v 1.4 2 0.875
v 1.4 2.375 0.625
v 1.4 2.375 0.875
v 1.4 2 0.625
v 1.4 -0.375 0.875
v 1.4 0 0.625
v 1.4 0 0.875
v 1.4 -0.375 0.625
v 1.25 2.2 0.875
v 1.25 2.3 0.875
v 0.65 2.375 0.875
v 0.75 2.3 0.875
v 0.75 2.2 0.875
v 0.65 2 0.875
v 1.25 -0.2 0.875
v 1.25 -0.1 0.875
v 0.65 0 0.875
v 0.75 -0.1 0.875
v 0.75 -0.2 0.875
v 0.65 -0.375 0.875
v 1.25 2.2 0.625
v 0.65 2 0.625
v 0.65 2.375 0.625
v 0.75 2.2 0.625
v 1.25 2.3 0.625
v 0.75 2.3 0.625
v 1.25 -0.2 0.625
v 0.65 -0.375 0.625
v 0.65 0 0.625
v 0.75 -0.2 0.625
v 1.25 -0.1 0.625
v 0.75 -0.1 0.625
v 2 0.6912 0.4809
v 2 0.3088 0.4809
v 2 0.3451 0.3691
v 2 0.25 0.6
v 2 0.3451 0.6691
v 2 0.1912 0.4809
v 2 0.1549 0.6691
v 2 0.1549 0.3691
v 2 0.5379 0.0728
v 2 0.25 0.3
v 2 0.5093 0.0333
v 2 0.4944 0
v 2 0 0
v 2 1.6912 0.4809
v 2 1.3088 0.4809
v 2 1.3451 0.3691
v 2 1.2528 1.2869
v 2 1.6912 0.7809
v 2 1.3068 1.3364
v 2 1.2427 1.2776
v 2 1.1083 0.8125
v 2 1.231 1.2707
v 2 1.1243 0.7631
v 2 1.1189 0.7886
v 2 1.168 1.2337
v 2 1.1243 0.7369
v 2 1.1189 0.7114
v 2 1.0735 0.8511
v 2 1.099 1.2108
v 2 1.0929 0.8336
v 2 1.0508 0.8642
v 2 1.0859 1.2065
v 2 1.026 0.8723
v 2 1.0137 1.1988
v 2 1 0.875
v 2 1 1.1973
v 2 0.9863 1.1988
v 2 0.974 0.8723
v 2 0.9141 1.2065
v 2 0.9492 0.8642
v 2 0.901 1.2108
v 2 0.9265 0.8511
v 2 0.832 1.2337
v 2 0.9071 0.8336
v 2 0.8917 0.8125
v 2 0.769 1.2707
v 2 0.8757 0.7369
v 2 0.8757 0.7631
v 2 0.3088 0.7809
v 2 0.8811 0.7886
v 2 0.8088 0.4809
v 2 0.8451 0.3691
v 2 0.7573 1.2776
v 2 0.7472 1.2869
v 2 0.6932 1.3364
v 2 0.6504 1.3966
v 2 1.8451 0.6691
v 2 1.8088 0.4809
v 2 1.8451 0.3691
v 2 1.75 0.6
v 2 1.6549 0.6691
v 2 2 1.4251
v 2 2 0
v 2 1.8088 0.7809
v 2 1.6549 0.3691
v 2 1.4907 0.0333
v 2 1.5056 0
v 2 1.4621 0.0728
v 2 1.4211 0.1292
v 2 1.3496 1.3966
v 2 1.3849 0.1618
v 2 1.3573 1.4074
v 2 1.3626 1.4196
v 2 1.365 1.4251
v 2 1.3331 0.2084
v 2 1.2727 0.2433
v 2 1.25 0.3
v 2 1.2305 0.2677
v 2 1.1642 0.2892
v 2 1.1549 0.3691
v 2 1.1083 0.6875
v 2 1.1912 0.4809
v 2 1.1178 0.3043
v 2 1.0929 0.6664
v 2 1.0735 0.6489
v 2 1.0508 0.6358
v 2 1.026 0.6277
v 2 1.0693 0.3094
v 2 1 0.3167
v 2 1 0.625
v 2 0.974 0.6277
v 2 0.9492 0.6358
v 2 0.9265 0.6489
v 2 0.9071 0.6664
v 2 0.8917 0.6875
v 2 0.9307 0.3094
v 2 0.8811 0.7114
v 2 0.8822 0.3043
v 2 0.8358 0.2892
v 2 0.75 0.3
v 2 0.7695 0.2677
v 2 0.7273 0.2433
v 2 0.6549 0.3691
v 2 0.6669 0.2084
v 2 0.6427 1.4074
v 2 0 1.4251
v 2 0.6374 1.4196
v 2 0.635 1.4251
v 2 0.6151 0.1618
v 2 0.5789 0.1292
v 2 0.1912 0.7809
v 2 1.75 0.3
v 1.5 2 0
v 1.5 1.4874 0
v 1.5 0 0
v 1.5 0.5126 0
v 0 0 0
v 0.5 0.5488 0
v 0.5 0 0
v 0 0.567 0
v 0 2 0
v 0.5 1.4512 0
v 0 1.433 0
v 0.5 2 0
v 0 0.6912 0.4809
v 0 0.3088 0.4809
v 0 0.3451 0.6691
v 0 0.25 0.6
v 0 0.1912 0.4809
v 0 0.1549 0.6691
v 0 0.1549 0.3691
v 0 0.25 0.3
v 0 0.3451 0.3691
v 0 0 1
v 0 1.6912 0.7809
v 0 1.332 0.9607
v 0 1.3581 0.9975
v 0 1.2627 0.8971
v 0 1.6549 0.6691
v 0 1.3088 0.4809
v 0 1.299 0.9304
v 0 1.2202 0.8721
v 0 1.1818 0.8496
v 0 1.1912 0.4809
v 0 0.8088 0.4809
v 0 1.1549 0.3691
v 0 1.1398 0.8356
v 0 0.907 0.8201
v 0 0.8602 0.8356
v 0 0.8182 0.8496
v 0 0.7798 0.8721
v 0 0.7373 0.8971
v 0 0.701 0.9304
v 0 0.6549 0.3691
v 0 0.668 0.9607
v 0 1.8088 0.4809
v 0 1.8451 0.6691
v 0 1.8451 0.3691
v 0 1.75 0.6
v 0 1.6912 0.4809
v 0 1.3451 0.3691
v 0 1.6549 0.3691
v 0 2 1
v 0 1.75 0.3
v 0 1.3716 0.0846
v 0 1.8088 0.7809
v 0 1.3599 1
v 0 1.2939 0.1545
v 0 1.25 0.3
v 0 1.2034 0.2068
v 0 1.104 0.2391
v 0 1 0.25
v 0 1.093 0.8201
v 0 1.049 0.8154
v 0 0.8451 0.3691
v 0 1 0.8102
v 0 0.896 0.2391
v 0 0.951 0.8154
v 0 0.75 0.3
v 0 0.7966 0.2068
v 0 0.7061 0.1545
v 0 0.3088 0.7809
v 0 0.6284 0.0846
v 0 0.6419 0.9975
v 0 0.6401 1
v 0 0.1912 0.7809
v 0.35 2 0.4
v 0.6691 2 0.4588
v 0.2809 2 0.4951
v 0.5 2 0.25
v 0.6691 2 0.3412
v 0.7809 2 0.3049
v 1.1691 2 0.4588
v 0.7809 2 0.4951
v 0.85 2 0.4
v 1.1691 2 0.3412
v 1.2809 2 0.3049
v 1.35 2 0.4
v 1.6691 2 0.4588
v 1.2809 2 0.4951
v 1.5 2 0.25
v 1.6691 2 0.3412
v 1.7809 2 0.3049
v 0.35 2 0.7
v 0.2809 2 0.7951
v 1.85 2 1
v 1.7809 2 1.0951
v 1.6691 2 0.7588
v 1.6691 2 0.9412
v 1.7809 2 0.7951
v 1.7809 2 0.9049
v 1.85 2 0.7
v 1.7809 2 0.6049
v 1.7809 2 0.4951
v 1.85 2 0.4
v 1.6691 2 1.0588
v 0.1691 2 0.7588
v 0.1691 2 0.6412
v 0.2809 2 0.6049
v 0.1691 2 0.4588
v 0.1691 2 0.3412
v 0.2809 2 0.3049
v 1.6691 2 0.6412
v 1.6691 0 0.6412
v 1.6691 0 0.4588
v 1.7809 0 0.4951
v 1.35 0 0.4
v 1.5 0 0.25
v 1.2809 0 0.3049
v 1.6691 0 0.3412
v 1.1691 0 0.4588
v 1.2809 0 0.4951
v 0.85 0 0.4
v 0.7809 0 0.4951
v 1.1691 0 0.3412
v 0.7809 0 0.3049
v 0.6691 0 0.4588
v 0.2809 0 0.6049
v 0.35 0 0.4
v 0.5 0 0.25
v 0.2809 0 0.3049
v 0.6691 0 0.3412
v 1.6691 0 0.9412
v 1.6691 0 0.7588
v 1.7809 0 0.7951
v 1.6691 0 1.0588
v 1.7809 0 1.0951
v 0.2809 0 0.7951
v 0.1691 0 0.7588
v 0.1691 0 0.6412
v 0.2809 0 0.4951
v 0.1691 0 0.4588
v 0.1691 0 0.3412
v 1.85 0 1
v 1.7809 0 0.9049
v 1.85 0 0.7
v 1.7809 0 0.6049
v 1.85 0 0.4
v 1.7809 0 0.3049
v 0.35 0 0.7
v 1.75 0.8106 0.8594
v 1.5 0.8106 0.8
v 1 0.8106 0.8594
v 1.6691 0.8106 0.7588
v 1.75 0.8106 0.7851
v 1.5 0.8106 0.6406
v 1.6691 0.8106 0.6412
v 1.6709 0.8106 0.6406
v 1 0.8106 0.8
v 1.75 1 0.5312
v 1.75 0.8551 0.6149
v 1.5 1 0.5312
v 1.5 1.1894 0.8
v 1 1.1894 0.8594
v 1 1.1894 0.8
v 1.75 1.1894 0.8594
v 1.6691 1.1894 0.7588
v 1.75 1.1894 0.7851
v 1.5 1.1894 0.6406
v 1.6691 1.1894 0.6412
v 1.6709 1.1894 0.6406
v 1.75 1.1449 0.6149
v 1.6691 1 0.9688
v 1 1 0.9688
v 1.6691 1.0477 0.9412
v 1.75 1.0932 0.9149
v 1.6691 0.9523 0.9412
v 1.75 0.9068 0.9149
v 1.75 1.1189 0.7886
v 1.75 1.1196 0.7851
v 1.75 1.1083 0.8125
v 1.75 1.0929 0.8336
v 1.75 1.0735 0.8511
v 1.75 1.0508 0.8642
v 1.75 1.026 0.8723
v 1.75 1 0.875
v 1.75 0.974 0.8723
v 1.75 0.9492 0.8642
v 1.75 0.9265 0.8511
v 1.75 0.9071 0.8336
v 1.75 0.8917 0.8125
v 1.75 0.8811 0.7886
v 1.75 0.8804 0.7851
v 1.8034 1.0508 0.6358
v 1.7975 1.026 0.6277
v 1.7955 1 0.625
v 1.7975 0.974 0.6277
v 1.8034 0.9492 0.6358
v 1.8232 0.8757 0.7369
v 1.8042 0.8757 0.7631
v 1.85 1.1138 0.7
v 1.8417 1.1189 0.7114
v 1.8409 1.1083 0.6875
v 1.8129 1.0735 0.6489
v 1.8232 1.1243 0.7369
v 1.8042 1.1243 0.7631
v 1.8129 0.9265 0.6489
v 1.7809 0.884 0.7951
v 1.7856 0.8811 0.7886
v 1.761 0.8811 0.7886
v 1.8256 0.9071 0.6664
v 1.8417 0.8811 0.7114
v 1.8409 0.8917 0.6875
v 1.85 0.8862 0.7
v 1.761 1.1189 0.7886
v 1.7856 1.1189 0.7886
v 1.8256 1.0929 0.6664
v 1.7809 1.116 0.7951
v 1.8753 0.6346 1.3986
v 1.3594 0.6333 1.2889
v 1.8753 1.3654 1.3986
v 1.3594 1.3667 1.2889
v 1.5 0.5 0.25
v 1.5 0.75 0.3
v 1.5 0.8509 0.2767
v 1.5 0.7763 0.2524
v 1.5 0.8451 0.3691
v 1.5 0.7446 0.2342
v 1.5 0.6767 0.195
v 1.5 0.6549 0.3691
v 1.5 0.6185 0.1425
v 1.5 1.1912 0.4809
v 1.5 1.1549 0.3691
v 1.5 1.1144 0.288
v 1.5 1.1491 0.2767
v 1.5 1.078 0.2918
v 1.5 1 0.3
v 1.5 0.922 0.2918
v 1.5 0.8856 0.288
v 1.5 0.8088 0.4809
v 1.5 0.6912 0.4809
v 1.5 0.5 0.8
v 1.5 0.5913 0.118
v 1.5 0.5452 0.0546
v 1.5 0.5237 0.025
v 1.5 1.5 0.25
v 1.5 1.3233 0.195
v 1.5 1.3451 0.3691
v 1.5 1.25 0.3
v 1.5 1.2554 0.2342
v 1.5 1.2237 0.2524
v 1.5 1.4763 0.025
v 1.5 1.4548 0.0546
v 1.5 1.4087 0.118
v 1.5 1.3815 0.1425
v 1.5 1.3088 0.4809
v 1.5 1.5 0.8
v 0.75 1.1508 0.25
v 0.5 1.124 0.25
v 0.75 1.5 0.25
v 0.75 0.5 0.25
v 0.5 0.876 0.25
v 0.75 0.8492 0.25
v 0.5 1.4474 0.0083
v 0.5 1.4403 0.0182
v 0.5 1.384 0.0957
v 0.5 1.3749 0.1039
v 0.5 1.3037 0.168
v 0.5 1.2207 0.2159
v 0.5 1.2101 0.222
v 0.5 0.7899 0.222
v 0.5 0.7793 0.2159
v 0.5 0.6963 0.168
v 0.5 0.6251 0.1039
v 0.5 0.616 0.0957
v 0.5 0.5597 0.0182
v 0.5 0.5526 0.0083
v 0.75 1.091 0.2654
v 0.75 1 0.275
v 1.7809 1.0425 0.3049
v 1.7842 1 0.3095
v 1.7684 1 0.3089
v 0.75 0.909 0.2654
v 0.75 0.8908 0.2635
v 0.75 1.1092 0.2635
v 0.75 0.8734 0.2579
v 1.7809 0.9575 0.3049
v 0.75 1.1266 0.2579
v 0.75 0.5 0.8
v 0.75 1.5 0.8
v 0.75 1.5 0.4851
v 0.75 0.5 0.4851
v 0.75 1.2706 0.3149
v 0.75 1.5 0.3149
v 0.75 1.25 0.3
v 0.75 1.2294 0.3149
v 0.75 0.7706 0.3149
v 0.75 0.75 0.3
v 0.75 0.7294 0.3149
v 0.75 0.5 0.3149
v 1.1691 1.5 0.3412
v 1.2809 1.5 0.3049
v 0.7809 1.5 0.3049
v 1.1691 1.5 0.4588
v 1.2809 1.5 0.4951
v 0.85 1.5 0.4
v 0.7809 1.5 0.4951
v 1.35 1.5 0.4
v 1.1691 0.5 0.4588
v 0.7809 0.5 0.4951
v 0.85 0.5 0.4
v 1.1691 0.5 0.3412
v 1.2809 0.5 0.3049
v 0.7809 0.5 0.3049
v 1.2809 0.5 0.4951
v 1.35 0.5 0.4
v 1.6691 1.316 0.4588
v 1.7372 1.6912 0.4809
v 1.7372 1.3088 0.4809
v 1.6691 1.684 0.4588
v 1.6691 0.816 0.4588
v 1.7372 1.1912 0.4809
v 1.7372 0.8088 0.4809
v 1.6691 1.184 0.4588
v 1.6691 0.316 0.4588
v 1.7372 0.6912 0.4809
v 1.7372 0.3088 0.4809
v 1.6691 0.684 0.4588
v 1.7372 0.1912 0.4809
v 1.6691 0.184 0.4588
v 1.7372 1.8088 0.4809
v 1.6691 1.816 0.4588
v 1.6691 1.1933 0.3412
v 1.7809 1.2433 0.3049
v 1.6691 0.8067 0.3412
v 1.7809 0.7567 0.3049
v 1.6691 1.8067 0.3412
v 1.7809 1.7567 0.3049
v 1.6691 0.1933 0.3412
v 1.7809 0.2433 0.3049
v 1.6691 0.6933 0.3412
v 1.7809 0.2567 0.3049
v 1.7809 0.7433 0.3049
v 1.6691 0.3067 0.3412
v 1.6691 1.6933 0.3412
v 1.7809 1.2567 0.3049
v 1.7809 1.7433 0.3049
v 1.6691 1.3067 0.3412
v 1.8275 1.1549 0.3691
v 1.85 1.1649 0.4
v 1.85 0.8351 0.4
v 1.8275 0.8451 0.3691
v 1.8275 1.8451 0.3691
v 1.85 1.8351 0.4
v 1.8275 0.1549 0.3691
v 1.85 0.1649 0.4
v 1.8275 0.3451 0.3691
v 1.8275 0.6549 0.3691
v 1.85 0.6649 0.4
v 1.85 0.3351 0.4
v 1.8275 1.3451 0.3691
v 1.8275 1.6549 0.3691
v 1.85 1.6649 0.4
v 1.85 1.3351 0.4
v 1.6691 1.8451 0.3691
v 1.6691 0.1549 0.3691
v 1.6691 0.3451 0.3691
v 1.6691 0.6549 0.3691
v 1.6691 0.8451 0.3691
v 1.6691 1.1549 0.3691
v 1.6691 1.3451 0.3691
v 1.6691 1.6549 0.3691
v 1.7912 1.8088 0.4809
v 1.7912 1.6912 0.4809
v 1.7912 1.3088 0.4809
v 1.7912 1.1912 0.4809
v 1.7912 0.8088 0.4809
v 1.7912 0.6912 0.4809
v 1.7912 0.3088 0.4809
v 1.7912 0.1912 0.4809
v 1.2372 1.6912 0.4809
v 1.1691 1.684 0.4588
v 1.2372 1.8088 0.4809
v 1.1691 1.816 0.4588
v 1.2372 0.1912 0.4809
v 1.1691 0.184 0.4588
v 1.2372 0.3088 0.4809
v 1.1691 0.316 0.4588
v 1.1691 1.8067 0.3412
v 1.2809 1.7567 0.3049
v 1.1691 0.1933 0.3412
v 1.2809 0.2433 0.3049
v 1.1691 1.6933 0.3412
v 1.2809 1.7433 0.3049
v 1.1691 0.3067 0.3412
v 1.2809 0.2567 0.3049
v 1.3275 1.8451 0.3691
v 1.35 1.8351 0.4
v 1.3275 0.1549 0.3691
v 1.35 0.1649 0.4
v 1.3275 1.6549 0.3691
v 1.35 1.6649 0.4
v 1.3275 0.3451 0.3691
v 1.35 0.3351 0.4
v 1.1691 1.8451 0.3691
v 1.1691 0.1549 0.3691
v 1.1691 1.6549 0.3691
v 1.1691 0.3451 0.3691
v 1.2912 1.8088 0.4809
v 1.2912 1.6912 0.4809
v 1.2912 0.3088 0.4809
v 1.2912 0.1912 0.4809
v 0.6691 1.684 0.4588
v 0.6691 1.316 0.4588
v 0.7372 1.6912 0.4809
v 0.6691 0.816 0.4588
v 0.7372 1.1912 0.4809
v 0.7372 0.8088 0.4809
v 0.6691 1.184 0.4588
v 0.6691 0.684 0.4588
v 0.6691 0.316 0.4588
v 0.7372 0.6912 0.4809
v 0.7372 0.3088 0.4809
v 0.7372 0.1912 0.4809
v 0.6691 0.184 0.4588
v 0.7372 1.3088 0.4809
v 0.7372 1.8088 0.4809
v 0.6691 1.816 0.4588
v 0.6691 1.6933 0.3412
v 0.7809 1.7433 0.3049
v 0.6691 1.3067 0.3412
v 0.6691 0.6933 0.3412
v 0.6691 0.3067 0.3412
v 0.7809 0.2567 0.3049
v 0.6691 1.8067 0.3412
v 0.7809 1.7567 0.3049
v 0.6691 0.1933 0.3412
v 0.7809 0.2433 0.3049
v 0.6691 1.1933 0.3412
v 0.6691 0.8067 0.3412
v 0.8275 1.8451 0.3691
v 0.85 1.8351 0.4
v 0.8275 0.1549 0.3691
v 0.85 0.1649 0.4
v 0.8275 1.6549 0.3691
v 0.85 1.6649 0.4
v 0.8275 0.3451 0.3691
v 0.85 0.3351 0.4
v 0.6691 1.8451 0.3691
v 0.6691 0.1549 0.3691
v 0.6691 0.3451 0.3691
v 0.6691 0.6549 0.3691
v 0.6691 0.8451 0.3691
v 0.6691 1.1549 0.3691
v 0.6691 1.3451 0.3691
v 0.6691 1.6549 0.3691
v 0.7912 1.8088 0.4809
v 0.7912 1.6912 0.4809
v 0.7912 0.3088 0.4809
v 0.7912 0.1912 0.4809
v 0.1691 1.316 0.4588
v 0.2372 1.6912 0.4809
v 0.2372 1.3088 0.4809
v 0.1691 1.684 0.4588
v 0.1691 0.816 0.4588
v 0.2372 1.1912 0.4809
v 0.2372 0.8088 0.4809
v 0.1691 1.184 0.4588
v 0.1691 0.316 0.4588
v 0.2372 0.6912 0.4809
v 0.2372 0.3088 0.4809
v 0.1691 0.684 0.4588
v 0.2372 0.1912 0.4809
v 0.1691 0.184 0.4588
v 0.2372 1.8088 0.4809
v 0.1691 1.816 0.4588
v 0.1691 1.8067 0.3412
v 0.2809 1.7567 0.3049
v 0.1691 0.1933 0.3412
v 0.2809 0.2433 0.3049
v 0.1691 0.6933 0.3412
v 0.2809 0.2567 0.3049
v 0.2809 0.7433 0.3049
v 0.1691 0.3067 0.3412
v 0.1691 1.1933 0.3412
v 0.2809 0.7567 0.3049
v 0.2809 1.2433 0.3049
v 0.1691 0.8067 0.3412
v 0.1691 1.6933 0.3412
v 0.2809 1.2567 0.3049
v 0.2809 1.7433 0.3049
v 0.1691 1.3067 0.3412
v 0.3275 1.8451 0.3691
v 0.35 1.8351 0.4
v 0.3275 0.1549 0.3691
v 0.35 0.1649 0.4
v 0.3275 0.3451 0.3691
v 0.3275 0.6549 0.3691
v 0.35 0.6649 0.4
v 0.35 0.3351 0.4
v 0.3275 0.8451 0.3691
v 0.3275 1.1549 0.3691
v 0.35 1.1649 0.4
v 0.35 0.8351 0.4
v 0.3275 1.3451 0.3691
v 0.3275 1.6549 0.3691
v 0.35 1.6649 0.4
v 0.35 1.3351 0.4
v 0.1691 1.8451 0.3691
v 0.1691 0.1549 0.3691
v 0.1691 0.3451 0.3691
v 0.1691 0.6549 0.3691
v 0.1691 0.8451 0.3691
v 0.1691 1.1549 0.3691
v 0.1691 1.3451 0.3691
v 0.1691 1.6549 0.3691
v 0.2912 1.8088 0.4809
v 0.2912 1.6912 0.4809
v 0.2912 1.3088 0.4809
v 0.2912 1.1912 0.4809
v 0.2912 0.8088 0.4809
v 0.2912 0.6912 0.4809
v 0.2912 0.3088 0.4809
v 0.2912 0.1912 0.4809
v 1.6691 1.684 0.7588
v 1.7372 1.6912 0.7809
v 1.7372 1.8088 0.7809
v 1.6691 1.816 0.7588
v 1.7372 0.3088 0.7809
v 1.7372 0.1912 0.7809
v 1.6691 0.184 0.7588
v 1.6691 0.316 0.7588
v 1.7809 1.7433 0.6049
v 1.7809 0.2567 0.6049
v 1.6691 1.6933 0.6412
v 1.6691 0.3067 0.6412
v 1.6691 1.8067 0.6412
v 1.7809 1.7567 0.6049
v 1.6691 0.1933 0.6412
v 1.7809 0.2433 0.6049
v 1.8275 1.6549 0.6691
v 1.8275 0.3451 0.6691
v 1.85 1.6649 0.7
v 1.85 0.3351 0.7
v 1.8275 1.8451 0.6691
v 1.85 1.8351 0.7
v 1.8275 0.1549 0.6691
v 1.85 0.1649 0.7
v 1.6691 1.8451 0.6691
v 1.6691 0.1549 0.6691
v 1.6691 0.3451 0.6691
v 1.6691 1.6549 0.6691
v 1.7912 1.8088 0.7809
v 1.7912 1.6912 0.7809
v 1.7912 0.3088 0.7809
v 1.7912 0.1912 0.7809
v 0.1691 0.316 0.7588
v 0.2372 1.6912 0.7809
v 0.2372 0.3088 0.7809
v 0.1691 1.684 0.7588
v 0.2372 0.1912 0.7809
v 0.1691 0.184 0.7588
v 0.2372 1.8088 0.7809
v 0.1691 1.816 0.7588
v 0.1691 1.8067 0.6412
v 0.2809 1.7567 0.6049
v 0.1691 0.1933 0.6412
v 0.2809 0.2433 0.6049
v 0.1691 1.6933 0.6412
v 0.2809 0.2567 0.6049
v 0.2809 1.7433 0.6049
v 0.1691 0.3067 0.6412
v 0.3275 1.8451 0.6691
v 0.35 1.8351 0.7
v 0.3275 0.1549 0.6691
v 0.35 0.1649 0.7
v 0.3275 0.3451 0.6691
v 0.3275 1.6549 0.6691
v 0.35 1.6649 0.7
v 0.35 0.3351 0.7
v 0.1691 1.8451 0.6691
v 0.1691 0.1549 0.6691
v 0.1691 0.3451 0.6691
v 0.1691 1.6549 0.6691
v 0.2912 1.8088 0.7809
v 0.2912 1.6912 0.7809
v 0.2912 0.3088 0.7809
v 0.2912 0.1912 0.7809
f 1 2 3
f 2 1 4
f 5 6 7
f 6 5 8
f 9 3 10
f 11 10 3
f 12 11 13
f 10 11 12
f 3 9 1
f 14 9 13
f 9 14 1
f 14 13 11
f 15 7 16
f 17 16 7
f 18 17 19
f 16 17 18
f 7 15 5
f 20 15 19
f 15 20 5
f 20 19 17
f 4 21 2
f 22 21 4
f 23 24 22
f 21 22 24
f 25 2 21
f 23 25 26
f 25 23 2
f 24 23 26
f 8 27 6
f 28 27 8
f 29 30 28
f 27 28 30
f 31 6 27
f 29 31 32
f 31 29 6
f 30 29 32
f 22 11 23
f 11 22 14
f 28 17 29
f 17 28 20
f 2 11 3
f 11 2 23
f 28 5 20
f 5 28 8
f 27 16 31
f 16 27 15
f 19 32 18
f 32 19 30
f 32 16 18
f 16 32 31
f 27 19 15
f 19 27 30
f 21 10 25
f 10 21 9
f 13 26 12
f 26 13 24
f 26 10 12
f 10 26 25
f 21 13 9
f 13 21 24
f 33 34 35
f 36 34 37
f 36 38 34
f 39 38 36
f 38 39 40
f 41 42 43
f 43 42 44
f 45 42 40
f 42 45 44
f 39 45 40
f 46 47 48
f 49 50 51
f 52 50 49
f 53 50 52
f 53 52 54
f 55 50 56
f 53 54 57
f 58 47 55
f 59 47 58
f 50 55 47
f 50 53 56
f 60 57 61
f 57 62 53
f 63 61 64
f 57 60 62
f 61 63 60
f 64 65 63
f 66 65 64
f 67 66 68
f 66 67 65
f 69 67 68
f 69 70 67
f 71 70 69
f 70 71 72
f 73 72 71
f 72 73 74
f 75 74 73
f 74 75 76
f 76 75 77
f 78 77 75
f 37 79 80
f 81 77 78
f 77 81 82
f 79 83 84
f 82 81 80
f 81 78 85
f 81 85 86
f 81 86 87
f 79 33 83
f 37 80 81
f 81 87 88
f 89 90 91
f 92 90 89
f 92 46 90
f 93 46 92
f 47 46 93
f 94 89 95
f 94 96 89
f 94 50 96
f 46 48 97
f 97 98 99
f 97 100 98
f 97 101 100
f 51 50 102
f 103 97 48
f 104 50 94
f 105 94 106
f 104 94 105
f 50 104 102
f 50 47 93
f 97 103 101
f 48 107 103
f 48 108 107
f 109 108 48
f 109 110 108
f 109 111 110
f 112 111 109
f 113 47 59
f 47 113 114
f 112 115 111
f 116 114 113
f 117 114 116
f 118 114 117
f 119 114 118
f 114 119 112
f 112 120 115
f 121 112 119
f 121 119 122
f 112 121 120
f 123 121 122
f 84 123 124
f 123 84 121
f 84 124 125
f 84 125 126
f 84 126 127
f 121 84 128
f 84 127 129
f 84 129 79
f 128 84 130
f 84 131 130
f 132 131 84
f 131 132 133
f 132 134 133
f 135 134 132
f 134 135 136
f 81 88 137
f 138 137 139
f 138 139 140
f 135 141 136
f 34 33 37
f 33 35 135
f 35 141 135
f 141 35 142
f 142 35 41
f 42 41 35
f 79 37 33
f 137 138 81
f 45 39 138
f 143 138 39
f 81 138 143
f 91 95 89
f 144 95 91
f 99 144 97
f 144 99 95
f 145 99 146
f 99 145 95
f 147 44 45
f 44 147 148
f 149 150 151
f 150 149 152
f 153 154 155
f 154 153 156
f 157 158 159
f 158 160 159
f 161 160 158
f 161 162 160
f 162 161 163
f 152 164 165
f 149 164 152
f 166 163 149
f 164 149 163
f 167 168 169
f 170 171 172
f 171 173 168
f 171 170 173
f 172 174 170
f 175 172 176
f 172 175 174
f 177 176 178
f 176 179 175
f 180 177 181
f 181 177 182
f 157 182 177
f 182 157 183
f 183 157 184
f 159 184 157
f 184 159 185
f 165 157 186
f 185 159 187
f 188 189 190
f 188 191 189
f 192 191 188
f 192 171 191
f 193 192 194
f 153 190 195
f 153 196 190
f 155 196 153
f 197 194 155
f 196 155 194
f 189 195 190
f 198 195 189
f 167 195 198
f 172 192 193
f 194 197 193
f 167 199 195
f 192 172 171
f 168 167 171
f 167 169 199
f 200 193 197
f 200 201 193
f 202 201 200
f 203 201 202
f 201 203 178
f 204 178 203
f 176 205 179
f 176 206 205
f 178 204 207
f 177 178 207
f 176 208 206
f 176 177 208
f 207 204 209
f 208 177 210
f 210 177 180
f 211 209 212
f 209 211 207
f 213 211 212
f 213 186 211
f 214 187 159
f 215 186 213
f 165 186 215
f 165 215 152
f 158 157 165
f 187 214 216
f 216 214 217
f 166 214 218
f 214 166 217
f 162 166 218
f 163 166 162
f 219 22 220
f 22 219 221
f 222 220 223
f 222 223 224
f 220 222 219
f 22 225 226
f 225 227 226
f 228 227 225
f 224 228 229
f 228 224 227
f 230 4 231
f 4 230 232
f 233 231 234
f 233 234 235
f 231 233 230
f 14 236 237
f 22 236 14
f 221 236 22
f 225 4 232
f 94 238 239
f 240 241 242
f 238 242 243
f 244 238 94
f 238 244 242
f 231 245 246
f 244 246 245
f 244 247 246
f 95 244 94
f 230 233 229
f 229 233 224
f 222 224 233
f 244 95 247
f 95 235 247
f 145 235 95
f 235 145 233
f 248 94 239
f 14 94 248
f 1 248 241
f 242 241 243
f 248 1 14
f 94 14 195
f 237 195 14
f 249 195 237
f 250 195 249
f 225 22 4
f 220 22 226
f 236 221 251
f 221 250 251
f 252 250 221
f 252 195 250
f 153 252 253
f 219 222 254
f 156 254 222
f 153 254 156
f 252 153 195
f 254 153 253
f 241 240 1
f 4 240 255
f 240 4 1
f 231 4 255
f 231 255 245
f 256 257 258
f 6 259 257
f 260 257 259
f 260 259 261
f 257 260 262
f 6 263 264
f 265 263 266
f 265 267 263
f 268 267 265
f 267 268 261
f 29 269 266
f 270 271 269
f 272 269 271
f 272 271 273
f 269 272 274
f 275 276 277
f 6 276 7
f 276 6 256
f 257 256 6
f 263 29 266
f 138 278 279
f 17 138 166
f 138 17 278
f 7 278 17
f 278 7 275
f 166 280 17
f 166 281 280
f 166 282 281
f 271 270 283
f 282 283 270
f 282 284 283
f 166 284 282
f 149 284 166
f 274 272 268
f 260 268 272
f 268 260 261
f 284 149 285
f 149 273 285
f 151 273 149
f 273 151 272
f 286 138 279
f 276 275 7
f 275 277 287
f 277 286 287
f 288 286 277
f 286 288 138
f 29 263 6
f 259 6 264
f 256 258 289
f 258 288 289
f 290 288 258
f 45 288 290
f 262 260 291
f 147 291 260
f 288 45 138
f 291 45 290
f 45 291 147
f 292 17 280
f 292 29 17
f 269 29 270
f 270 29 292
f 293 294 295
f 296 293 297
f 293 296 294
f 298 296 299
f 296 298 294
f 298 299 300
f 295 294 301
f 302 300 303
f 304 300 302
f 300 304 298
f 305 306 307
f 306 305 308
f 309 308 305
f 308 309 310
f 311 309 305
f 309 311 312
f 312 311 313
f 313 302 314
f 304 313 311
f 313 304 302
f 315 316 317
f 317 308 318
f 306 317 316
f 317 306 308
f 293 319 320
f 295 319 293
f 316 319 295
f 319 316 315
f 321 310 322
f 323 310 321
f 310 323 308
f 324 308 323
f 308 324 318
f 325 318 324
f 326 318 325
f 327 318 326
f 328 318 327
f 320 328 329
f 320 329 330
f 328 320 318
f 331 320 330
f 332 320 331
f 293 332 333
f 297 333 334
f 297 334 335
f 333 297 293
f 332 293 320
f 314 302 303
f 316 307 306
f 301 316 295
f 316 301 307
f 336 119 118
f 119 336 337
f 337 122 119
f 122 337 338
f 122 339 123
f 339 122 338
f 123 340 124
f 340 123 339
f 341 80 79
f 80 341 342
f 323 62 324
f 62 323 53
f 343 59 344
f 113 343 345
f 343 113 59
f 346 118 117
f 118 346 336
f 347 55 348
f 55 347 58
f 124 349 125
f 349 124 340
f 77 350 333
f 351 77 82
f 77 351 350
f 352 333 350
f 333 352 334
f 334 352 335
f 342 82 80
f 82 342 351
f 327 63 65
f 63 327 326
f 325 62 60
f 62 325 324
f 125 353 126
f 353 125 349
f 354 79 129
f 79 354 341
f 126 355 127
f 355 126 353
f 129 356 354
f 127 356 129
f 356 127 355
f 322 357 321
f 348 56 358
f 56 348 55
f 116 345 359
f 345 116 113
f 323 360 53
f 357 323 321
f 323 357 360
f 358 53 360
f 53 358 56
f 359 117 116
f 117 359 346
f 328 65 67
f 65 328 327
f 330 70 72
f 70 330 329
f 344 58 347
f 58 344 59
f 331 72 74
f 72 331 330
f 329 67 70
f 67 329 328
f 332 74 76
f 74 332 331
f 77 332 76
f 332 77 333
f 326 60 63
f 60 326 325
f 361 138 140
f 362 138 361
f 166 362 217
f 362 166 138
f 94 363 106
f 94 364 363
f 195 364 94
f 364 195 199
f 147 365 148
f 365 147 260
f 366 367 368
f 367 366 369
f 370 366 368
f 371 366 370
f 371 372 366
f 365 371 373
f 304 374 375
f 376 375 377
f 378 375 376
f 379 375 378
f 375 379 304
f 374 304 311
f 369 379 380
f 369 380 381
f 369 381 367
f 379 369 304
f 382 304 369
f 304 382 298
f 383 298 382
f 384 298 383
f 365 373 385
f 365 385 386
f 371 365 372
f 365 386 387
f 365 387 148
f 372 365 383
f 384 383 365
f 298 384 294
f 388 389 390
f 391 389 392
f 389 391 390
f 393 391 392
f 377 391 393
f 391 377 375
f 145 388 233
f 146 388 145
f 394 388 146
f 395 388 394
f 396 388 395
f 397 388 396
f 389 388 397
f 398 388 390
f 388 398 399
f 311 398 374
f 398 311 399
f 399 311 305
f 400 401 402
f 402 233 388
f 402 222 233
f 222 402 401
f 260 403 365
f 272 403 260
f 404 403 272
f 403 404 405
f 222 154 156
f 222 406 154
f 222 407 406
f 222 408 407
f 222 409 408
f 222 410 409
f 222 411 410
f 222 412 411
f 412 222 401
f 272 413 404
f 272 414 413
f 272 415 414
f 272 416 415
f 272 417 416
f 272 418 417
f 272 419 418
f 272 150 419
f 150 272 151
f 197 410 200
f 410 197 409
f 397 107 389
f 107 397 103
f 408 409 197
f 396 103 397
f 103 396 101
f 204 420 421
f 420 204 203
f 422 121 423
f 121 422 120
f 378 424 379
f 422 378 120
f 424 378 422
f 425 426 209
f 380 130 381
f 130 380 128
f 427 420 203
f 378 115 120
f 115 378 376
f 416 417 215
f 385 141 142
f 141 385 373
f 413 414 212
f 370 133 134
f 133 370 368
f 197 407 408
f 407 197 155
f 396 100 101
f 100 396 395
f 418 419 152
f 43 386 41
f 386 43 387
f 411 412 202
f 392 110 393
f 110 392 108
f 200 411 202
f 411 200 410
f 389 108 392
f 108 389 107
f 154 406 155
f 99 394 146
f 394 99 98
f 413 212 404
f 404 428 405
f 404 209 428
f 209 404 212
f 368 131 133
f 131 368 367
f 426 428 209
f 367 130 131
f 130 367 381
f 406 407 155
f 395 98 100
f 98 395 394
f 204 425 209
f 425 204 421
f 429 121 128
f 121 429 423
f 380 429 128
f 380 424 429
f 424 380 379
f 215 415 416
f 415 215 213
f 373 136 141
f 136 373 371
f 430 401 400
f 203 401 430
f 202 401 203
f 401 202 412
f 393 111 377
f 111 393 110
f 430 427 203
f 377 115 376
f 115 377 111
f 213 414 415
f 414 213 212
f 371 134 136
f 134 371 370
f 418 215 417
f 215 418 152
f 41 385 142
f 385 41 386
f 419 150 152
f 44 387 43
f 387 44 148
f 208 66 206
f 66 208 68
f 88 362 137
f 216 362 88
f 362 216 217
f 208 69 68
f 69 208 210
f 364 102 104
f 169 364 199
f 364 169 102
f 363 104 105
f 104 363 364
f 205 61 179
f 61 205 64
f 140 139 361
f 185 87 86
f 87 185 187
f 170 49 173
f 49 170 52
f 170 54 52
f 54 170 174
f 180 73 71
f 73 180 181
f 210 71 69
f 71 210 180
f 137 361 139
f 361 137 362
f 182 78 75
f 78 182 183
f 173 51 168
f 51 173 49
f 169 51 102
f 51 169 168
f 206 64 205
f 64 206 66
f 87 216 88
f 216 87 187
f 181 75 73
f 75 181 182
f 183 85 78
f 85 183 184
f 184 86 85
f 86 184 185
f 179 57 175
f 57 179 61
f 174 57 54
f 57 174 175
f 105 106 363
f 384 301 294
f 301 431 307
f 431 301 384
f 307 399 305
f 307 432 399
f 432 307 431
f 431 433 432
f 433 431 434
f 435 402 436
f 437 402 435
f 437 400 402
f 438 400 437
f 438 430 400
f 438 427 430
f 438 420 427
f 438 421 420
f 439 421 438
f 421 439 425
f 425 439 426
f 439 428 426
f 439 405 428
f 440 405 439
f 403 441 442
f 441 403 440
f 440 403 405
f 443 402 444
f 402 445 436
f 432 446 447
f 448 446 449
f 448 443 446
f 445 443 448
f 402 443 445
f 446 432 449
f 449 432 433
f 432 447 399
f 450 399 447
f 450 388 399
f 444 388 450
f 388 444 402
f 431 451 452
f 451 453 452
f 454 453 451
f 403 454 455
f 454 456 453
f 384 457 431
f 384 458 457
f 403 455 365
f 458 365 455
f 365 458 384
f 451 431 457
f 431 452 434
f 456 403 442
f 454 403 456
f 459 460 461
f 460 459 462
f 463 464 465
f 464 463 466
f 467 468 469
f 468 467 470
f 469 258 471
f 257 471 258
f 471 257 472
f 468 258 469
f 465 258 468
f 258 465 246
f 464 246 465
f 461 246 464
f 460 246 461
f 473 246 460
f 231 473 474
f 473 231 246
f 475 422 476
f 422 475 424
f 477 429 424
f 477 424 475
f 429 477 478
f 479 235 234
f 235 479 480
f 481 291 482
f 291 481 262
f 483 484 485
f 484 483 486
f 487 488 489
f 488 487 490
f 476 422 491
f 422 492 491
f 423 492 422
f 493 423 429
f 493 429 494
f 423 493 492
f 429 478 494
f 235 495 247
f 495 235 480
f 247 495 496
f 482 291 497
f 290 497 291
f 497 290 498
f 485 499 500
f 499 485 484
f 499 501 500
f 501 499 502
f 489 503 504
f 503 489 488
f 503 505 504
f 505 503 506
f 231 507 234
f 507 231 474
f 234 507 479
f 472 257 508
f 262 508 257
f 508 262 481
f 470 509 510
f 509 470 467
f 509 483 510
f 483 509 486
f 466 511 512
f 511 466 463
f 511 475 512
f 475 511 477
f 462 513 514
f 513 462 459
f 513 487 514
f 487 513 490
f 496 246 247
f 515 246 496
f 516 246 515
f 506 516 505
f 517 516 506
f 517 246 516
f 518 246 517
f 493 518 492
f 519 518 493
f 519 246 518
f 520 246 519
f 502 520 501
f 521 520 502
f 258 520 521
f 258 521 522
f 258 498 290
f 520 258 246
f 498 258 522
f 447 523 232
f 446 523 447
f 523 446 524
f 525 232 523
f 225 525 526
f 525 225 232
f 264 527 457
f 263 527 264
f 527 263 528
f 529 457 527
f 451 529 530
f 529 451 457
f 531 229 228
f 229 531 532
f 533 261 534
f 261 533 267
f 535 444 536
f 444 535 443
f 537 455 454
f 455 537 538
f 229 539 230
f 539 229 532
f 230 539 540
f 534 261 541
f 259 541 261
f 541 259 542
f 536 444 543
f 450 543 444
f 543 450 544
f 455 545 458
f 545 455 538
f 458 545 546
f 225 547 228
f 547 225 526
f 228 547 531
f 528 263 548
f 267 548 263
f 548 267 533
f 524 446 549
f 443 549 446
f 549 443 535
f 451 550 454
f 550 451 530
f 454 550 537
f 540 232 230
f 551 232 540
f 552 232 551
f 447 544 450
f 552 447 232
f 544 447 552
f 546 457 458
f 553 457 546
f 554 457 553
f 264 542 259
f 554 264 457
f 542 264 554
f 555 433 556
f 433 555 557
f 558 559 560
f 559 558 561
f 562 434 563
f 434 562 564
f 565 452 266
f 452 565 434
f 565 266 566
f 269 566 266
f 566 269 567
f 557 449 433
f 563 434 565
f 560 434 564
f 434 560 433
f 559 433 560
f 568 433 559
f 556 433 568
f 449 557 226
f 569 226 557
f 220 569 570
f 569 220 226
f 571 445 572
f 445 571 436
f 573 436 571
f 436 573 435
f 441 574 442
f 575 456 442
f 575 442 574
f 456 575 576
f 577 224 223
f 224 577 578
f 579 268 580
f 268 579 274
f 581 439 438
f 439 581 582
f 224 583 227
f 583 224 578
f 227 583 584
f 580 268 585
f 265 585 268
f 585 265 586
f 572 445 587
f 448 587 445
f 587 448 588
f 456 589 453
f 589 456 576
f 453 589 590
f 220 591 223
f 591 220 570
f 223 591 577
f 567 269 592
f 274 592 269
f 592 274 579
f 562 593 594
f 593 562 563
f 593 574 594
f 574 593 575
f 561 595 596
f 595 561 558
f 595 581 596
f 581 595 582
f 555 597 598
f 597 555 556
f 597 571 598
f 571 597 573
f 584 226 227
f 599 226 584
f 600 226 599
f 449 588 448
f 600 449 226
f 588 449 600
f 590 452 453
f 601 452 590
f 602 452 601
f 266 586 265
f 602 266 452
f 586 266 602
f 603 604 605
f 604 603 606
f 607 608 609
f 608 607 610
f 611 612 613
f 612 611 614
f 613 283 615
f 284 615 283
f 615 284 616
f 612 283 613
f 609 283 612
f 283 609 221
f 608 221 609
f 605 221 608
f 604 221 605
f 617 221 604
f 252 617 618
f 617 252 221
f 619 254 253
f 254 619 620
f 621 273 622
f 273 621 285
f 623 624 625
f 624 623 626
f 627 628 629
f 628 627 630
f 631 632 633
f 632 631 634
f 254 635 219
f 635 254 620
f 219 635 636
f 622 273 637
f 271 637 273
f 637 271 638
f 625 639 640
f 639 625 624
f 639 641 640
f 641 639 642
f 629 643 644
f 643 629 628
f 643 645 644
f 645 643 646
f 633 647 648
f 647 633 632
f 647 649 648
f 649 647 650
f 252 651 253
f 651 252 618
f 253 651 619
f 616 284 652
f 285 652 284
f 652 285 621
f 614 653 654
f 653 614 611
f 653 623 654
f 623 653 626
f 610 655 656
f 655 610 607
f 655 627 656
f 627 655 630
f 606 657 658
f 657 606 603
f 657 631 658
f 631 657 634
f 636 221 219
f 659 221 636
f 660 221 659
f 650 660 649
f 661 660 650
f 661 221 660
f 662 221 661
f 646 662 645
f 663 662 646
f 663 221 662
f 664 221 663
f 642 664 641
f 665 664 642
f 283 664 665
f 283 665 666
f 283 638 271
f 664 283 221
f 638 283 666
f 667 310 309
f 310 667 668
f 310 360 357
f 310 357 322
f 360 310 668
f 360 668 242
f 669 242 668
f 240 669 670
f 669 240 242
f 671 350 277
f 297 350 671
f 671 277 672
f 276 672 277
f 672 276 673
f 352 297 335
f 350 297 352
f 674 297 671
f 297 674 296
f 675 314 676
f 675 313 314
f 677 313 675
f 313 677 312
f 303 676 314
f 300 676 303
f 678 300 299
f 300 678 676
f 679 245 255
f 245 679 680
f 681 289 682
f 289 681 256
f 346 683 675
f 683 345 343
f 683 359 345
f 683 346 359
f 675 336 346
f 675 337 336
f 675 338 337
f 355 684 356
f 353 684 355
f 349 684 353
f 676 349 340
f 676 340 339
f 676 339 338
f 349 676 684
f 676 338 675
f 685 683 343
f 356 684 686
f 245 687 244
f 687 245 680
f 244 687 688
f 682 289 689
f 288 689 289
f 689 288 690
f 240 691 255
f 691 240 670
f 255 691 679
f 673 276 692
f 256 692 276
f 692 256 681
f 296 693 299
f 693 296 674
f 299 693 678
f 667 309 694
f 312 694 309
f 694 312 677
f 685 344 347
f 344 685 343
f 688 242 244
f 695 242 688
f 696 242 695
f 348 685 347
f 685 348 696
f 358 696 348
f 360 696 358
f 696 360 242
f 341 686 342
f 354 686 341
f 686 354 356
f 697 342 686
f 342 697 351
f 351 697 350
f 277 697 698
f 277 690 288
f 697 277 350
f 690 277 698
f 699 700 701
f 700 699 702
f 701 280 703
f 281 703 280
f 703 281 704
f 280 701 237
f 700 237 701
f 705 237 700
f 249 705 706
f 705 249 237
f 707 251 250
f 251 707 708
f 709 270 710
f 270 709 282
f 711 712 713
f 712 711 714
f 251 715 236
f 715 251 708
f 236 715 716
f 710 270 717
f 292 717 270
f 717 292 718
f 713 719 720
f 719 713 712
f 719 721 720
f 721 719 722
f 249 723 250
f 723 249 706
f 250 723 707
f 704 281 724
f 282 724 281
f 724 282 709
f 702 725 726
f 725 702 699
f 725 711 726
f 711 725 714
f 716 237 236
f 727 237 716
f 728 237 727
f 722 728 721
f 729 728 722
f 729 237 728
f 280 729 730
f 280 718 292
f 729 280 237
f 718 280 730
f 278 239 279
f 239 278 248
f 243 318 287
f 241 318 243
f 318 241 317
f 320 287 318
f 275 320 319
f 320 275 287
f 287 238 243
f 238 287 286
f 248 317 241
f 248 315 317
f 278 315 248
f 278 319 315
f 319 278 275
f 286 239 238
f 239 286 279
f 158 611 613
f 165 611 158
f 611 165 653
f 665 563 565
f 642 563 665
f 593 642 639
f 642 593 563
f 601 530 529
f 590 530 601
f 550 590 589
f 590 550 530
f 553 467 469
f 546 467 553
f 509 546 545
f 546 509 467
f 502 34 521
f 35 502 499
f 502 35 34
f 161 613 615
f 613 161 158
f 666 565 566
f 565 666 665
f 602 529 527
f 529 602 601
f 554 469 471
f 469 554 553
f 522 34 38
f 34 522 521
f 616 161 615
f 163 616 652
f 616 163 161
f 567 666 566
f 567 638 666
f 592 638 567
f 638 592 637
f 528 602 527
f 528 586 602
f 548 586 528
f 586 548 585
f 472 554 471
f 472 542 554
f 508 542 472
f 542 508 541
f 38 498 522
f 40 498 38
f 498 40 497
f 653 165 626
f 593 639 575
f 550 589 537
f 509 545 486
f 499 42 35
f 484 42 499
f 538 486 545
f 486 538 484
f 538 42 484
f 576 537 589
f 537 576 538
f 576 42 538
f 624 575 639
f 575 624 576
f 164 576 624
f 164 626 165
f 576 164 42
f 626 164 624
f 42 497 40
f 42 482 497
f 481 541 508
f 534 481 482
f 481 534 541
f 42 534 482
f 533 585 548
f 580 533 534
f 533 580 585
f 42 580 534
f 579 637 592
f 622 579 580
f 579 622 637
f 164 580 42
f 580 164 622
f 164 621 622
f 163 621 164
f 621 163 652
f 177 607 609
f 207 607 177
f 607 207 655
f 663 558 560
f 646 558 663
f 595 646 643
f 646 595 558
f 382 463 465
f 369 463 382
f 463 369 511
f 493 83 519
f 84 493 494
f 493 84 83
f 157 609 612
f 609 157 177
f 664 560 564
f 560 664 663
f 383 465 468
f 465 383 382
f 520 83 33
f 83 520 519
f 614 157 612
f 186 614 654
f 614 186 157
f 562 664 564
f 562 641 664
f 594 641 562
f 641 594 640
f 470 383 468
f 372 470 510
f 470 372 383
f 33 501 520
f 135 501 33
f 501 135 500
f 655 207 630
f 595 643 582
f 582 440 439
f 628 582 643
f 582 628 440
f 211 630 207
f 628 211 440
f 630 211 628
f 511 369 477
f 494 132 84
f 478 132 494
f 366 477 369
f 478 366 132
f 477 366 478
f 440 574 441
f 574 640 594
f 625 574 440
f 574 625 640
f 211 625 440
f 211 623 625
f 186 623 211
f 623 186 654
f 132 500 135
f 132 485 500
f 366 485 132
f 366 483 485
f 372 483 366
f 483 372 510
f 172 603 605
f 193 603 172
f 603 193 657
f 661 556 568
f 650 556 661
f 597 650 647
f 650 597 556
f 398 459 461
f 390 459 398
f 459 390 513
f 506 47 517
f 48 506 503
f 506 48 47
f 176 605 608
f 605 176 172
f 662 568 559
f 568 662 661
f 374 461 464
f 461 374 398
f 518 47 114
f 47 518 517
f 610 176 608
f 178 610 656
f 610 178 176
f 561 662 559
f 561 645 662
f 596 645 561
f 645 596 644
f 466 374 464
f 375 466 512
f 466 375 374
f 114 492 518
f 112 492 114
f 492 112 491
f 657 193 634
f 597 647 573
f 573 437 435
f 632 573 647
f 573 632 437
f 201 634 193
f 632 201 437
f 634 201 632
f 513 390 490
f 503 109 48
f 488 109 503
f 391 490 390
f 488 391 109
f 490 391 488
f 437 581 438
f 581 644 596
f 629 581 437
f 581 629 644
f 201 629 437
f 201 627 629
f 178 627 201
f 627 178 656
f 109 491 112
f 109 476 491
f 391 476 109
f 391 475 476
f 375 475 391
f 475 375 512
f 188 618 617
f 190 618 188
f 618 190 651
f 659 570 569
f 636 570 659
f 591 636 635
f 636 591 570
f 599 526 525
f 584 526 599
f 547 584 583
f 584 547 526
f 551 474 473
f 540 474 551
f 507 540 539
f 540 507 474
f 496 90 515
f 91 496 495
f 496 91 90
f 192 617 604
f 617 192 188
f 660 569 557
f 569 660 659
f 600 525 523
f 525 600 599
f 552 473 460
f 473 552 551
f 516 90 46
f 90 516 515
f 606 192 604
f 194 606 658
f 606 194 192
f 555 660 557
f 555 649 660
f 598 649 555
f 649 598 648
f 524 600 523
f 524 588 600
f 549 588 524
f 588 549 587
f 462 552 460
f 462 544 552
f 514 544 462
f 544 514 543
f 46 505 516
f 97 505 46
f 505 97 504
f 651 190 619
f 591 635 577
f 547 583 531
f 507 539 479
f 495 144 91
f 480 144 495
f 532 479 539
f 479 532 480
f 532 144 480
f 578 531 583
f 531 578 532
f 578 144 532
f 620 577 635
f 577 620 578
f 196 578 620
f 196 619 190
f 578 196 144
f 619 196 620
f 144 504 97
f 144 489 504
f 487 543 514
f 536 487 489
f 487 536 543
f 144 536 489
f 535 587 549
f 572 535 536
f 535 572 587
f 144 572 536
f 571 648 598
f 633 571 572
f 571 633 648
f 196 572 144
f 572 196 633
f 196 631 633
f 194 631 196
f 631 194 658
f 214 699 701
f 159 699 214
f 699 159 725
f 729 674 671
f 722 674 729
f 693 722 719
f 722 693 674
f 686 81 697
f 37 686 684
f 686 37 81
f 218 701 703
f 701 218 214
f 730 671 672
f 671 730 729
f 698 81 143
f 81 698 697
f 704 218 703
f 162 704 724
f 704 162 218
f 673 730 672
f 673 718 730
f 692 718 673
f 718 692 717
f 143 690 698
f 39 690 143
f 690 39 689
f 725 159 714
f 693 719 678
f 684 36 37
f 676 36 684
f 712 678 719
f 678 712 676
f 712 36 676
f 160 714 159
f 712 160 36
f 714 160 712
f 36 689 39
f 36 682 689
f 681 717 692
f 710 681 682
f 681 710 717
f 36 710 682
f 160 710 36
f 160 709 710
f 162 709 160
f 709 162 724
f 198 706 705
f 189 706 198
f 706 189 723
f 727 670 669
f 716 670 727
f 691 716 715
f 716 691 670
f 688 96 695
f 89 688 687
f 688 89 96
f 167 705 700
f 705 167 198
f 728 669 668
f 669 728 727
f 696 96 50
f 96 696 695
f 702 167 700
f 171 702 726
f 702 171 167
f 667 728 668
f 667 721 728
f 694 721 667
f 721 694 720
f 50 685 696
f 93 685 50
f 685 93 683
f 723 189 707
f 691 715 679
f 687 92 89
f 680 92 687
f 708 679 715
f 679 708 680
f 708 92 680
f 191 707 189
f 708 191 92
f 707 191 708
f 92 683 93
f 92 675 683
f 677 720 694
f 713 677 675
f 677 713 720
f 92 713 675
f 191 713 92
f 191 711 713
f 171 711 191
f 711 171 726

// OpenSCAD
// Trying to be a trekking pole camera mount
// jellsworth Dec 2014
//
// units = inches



difference() {
	union(){
		// base block
		translate([0, 0, 0]) {
			cube([ 2, 2, 1.5 ], false);
		}

		// add strap supports
		difference() {
			// add strap base
			// center with bolt hole
			translate( [0.65, -0.375, 0.5 + 1/8]) {
				cube([ 0.75, 2.75, 0.25]);
			}
			
			// cut strap holes
			translate([0.75, -0.2, 0]){
				cube([0.5, 0.1, 2], false);
			}
			translate([0.75, 2.2, 0]){
				cube([0.5, 0.1, 2], false);
			}
		}
	}



	// remove wedge
	translate([ 0, 0, 1]) {
		rotate([ 0, -12, 0]) {
			cube([ 3, 2, 1 ], false);
		}
	}

	// remove cross-cut
	translate([ 0.5, -0.5, 0]) {
		cube([ 1, 3, 0.25 ], false);
	}


	// remove pole channel 1
	translate([ 0, 1, -0.25]) {
		rotate([ 0, 90, 0]) {
			cylinder(h = 6, r1 = 0.5, r2 = 0.7, center = false, $fn=30);
		}
	}

	// remove pole channel 2
	translate([ -3.2, 1, 0.7]) {
		rotate([ 0, 80, 0]) {
			cylinder(h = 6, r1 = 0.5, r2 = 0.4, center = false, $fn=30);
		}
	}


	//cut hole for bolt
	//1/4" - 20 x 3/4" (w/ 7/16" head)
	translate([1, 1, 0.75]){
		rotate([0, 90, 0]){
			cylinder(h = 0.75, d=7/16, $fn=6);
			cylinder(h = 1.5, d=1/4, $fn=30);
		}
	}

	//cut bolt access
	translate([0.75, 0.5, 0]){
		cube([ 0.75, 1, 0.8]);
	}
	
	//reduce volume
	// bottom row
	vhole(1.75, 0.4);
	vhole(1.25, 0.4);
	vhole(0.75, 0.4);
	vhole(0.25, 0.4);

	//  middle row
	vhole(1.75, 0.7);
	vhole(0.25, 0.7);

	//  top row
	vhole(1.75, 1);

	//endwise holes
	//bottom
	vhole2(0.25, 0.4);
	vhole2(0.75, 0.4);
	vhole2(1.25, 0.4);
	vhole2(1.75, 0.4);

	//top
	vhole2(0.25, 0.7);
	vhole2(1.75, 0.7);


}

// create cross-holes to reduce volume
module vhole(hx,hz,diam=0.2) {
	translate([hx, -0.5, hz]){
		rotate([-90, 0, 0]){
			cylinder(h = 3, d=diam, $fn=5);
		}
	}
}

// create lengthwise holes to reduce volume
module vhole2(hy,hz,diam=0.2) {
	translate([-0.5, hy, hz]){
		rotate([0, 90, 0]){
			cylinder(h = 3, d=diam, $fn=5);
		}
	}
}
